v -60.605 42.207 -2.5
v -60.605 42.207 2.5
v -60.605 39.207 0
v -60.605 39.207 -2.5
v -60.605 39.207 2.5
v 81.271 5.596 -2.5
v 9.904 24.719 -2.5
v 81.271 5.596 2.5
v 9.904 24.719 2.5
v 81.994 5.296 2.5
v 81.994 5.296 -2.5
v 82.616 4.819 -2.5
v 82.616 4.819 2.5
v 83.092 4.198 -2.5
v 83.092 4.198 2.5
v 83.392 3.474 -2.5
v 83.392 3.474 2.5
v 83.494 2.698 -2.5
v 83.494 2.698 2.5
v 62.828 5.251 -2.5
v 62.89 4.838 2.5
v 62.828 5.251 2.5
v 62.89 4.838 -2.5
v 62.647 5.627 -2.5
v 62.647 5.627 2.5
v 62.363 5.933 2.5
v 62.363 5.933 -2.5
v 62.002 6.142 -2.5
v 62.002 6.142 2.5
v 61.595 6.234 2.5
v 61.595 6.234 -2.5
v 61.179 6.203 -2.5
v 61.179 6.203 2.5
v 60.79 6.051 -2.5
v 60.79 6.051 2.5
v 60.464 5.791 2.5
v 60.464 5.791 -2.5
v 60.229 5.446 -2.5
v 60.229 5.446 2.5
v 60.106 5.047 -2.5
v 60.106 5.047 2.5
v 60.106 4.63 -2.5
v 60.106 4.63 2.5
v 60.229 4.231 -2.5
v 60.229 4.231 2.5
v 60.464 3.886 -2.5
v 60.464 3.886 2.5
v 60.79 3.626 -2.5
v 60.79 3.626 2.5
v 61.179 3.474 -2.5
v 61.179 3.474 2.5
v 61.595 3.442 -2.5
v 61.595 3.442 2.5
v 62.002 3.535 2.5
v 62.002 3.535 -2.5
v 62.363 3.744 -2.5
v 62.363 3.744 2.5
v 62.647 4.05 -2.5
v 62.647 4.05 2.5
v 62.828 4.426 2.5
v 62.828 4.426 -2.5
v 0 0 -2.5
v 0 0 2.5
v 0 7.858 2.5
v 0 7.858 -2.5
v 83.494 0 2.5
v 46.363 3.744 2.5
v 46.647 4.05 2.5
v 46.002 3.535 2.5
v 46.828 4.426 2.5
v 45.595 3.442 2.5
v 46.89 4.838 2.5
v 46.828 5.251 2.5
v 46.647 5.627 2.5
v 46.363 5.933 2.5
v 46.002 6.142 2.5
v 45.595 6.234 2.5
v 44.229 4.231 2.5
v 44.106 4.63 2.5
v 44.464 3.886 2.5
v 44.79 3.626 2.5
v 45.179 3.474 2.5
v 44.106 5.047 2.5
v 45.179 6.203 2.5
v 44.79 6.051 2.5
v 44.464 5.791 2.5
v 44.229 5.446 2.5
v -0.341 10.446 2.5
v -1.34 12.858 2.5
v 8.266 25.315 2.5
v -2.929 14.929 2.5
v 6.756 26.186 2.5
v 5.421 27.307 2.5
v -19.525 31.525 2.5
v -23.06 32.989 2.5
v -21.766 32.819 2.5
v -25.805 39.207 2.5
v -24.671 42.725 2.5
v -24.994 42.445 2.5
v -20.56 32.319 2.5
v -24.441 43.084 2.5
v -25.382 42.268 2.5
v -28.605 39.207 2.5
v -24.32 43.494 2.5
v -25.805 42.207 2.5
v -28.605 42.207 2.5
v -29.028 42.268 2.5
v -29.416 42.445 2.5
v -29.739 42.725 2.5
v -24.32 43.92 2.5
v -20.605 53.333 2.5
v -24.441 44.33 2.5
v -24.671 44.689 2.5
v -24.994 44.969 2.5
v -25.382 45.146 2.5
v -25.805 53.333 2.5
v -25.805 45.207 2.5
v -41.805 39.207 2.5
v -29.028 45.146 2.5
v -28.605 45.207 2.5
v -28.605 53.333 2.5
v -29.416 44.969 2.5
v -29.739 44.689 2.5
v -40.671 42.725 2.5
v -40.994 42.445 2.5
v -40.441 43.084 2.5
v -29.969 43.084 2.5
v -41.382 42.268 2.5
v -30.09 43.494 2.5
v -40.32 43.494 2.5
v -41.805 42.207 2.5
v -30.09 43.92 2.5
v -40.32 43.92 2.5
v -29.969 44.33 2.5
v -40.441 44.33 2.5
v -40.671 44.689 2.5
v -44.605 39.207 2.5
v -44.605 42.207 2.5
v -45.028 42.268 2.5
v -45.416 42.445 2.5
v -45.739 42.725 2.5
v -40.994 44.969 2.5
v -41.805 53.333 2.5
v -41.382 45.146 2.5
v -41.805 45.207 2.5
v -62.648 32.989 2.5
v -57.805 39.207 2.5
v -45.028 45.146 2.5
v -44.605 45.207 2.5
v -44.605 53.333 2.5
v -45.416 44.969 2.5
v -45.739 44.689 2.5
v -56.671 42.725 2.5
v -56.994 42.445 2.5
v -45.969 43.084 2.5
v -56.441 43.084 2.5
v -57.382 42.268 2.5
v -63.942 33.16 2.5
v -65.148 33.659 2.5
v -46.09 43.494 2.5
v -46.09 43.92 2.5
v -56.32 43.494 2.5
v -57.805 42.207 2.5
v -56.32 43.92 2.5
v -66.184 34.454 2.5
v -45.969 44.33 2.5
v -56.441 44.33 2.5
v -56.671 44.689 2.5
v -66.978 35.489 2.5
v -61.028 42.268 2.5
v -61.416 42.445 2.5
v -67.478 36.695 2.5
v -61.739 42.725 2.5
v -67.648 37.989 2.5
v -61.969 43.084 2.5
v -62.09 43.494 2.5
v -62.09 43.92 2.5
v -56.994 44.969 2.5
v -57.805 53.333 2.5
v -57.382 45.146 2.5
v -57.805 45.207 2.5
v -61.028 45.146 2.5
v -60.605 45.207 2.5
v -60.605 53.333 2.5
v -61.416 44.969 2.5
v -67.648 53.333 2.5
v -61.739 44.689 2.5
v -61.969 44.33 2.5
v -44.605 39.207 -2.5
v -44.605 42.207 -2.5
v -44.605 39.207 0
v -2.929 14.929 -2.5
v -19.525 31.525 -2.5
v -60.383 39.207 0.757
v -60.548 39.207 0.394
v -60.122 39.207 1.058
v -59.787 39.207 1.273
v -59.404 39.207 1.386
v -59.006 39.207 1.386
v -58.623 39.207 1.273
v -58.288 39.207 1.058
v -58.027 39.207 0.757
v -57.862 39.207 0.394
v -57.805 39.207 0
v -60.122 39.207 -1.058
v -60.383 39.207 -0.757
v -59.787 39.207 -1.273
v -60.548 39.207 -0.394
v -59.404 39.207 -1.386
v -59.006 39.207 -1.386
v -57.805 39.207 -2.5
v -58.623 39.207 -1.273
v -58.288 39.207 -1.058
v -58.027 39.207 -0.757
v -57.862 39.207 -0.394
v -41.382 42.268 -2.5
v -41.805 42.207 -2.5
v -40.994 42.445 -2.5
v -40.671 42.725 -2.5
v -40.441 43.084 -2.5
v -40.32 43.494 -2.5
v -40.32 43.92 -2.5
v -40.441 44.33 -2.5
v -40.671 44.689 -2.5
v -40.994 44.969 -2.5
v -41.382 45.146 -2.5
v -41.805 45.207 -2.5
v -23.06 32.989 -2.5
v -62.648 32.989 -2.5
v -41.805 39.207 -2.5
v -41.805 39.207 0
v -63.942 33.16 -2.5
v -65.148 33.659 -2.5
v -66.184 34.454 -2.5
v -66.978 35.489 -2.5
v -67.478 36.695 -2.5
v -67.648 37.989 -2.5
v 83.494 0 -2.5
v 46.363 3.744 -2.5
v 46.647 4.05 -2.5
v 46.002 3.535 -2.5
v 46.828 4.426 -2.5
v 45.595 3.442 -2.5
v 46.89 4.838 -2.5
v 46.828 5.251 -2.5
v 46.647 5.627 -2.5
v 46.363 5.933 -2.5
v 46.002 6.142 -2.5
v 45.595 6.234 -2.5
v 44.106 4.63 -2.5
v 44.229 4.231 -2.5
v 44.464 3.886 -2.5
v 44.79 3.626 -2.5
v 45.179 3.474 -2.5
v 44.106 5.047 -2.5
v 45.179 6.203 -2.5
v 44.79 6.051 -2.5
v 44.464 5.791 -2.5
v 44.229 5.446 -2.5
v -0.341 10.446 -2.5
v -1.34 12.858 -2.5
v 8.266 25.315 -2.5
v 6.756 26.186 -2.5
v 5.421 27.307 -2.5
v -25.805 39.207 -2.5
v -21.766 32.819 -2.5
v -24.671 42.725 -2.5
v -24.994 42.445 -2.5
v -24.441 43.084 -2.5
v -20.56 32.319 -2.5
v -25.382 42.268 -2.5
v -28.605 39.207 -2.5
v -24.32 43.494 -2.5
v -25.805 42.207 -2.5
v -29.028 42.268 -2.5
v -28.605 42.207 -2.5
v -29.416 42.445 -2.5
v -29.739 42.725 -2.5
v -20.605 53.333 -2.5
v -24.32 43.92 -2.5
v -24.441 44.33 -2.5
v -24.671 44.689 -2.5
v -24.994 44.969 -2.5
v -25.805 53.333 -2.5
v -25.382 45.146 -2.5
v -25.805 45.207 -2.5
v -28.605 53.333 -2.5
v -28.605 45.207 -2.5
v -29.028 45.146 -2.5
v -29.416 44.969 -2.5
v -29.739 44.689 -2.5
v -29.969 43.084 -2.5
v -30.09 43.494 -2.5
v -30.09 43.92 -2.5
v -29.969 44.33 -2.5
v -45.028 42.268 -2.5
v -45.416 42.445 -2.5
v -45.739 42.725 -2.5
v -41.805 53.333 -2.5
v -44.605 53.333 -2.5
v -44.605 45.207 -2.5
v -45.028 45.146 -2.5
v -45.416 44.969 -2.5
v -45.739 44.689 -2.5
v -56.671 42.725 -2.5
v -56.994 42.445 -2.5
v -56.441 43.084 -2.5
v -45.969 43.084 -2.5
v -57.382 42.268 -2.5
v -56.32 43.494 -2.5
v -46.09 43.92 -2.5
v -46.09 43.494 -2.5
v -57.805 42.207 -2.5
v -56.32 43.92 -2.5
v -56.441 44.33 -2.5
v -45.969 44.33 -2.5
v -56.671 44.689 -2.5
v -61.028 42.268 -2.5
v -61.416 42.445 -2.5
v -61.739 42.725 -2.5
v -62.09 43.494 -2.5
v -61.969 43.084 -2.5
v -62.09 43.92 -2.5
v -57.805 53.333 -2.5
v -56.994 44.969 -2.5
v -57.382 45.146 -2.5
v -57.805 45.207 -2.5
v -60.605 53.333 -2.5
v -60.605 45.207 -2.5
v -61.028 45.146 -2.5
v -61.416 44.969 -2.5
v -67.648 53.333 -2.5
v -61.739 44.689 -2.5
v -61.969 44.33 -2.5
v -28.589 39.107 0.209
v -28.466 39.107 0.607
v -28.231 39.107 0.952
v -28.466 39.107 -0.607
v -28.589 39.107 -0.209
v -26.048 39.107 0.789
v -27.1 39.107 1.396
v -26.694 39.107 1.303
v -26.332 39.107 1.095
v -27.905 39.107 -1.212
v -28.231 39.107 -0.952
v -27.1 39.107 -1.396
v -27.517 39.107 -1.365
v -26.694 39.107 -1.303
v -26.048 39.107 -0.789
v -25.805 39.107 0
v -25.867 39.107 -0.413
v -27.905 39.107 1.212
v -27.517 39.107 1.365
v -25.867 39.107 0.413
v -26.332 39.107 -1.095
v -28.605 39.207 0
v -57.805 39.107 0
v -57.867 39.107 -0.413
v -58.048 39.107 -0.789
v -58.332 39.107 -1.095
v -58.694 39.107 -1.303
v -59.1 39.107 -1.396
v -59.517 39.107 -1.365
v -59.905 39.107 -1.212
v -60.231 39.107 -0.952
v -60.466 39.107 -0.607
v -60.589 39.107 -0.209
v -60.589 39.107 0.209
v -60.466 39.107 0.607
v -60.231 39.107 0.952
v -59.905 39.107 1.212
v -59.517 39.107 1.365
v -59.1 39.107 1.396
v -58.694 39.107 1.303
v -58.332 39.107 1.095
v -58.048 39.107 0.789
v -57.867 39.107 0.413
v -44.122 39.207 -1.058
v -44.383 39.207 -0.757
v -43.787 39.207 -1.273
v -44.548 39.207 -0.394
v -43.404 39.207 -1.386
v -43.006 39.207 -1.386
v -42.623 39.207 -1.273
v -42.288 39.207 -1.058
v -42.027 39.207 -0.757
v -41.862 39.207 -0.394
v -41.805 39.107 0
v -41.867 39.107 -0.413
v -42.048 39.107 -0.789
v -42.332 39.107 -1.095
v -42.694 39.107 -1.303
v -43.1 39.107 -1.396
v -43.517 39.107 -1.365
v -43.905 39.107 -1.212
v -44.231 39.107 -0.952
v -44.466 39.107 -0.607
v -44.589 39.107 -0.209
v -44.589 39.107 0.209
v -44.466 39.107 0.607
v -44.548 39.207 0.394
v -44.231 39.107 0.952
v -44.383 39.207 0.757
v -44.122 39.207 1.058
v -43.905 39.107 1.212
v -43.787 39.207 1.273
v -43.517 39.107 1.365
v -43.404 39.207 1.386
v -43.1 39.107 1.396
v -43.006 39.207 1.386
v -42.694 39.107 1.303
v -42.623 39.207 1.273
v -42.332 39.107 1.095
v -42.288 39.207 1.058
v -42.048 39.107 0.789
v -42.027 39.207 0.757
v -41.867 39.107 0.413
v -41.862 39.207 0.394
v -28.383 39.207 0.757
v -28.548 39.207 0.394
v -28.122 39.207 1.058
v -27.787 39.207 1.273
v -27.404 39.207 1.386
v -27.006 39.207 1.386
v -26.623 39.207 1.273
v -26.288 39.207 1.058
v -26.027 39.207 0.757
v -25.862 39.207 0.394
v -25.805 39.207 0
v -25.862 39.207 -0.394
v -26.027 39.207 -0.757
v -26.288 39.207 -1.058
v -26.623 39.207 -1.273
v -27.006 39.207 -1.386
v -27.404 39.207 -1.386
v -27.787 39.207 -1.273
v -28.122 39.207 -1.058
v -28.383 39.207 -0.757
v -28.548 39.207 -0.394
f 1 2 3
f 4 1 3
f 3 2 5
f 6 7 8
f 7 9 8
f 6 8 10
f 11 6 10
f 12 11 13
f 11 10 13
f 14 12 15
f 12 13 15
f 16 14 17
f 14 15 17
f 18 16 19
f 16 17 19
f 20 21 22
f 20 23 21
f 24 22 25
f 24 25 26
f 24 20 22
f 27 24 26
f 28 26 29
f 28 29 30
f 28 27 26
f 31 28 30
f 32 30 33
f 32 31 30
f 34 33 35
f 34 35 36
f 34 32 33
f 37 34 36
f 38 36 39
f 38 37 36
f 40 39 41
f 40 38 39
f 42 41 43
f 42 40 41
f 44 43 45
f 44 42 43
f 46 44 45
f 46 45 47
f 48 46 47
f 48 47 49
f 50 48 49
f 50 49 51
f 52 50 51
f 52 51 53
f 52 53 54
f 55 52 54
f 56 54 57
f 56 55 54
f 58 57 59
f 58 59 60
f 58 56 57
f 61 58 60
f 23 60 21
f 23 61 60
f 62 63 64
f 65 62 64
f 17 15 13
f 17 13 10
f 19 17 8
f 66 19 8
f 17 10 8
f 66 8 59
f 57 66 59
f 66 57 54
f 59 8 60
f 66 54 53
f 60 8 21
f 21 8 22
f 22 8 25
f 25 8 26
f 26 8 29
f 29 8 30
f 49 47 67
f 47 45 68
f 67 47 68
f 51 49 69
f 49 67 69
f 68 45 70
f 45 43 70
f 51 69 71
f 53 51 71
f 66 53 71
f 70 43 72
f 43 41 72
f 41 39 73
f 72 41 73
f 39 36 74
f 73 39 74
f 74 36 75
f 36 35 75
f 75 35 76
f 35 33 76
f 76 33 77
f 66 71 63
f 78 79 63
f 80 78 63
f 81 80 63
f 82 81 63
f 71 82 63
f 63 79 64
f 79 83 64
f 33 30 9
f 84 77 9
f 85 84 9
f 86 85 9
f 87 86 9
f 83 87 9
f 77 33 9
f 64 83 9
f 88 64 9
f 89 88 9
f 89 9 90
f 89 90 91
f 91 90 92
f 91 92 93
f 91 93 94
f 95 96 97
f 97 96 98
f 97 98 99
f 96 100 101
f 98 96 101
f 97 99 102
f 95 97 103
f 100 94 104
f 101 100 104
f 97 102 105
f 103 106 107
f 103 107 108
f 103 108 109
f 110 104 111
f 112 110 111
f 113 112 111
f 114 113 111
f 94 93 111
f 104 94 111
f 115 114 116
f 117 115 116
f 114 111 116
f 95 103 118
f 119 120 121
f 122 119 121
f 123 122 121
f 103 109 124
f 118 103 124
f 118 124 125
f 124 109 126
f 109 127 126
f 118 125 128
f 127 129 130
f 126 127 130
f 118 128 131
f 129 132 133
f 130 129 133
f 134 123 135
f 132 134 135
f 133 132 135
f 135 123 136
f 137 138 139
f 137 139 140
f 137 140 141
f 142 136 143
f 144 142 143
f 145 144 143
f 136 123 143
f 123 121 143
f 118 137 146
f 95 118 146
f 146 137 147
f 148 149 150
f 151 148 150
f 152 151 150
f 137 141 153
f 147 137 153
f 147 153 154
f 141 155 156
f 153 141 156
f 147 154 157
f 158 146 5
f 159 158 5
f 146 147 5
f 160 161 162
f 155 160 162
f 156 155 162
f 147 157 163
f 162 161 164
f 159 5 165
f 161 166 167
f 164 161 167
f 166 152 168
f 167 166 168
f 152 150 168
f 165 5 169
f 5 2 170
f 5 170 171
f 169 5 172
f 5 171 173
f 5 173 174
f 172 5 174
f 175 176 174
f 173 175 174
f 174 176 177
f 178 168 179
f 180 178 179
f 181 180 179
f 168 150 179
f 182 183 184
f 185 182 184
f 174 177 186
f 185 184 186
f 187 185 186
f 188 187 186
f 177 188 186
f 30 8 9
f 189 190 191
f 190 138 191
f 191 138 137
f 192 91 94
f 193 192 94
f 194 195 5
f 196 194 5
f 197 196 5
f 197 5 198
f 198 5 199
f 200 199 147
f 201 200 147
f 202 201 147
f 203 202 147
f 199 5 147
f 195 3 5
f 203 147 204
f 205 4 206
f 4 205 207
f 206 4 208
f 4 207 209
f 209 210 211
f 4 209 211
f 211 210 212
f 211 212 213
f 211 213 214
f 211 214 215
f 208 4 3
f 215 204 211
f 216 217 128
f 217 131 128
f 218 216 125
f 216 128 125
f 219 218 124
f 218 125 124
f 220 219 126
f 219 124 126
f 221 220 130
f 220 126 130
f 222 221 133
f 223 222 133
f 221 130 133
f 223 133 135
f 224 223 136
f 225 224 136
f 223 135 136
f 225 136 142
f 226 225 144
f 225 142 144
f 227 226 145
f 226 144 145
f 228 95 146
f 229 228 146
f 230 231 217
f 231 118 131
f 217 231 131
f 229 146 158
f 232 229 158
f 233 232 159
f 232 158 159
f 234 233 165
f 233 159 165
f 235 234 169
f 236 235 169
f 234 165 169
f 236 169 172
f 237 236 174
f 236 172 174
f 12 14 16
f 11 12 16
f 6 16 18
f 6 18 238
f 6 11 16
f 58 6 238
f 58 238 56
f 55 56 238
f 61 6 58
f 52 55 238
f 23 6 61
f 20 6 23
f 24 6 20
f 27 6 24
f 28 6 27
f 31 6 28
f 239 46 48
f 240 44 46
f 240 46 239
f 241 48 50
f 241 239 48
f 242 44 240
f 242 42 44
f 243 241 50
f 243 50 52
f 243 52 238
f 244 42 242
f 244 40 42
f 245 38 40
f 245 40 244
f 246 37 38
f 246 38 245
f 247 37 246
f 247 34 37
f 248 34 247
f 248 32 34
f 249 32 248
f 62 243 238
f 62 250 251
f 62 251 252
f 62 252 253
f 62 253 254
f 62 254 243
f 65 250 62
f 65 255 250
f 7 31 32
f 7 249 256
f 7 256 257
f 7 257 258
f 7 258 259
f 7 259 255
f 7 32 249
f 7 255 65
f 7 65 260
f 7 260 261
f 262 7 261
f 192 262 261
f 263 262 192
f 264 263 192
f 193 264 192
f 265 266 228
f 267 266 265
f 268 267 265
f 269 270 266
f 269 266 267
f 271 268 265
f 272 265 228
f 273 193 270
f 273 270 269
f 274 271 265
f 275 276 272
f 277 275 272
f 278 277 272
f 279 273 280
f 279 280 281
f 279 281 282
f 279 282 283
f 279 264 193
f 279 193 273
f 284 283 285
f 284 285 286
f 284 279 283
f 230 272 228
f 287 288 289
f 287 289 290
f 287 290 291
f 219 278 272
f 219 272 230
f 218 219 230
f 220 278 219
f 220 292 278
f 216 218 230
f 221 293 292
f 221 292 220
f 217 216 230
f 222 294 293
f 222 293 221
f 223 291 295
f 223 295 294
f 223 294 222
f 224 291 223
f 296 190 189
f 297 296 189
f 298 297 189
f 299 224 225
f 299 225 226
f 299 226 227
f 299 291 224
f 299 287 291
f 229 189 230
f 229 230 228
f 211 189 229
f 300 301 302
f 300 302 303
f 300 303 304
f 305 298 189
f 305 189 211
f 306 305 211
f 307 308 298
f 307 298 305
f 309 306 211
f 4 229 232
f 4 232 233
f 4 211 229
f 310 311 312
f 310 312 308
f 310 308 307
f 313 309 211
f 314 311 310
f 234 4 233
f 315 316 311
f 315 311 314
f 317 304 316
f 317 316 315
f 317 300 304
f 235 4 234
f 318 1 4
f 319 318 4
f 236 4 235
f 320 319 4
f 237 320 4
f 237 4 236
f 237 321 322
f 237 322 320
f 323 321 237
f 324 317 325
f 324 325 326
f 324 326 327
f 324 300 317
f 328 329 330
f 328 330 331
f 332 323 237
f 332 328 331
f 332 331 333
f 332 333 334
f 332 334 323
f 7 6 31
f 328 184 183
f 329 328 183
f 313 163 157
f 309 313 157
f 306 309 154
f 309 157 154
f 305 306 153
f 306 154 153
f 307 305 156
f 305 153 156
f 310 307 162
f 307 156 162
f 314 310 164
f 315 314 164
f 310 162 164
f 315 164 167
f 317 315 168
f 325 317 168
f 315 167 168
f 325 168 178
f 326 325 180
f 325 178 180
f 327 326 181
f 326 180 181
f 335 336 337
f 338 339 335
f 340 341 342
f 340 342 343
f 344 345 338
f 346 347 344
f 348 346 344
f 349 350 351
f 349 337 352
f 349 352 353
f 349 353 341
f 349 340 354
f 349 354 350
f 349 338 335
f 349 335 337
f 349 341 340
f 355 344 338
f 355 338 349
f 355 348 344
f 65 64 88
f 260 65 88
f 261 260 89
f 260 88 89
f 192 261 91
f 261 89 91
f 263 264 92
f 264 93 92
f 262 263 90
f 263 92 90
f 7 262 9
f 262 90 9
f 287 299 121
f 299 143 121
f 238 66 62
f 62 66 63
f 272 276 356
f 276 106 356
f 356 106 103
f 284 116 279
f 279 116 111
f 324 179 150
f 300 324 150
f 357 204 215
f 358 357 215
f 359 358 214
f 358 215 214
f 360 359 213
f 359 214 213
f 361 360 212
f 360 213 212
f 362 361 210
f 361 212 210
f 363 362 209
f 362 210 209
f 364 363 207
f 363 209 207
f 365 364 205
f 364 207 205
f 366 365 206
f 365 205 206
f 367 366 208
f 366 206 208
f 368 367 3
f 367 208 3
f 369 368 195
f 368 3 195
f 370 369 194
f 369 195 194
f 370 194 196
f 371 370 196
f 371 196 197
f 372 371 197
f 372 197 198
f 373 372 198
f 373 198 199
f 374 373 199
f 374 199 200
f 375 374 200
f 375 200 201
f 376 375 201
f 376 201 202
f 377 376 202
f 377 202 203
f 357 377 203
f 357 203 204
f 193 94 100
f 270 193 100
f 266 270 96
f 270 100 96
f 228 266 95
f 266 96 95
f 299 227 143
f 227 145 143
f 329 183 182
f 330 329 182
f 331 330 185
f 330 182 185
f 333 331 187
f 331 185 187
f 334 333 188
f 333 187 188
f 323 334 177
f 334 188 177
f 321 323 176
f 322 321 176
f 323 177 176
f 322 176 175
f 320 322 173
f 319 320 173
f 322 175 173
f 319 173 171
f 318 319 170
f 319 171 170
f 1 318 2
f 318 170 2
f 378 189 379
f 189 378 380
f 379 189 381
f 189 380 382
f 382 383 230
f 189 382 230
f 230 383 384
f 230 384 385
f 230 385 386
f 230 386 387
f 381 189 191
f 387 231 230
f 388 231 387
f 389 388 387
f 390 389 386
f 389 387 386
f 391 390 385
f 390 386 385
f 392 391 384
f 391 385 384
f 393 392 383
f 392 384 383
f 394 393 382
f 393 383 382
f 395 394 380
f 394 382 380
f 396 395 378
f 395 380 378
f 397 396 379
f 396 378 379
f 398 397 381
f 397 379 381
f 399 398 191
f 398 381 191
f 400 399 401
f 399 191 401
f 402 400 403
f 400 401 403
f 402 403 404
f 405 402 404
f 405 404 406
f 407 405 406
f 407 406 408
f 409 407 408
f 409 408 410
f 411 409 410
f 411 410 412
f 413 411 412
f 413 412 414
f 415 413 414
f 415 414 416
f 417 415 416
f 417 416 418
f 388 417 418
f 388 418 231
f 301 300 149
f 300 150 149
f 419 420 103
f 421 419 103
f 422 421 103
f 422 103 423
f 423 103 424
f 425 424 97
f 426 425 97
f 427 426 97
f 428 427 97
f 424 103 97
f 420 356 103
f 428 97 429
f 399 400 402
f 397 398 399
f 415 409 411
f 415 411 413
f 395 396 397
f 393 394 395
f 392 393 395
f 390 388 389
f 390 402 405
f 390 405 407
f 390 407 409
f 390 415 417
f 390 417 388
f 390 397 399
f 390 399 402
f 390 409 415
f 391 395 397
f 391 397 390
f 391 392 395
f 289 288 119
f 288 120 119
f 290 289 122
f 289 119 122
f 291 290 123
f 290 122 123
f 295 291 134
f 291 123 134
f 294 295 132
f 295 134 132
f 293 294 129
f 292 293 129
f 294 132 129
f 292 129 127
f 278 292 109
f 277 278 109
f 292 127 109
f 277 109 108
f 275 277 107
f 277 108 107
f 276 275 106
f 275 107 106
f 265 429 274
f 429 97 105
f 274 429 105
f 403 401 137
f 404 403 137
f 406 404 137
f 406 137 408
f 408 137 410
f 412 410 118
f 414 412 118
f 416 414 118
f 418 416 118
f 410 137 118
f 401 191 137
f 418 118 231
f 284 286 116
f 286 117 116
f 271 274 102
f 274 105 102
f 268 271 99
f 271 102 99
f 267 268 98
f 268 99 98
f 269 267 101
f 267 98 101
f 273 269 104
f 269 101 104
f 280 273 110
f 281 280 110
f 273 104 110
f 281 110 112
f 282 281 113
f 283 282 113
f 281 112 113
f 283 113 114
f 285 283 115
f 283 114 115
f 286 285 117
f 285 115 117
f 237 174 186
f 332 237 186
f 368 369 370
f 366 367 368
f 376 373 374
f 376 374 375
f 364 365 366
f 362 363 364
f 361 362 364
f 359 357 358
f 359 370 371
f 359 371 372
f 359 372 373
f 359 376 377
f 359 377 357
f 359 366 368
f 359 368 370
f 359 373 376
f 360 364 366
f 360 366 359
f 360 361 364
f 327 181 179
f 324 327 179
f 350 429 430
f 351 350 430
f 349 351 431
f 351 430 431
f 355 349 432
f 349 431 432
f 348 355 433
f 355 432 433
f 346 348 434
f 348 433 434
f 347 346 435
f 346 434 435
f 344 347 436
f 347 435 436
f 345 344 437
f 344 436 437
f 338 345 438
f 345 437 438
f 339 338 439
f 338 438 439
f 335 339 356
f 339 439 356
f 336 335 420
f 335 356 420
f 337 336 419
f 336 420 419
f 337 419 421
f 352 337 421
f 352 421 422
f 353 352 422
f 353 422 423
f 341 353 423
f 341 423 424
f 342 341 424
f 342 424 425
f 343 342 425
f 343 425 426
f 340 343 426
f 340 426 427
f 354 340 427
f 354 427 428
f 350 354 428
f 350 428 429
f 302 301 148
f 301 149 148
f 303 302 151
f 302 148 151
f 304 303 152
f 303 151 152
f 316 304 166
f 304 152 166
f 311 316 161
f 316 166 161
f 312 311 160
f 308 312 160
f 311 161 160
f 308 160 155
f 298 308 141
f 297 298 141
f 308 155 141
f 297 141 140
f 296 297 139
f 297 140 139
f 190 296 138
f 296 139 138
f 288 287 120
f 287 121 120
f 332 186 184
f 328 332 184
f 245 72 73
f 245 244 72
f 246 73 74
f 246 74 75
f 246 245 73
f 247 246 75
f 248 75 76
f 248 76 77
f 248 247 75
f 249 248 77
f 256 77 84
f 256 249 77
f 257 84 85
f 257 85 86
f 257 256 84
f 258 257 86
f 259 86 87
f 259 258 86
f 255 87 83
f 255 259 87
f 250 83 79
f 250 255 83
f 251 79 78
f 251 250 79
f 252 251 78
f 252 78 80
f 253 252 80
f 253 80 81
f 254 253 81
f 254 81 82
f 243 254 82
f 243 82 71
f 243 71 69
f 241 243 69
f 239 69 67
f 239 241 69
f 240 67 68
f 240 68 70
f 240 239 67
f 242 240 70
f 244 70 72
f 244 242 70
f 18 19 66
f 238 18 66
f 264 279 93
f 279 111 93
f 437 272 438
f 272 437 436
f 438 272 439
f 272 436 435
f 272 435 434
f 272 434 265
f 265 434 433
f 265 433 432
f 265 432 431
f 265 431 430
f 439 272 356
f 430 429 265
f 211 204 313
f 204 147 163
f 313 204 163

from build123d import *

# Parameters (mm, degrees)
SKETCH_1_R          = 1.4
EXTRUDE_1_DEPTH     = 2.5
SKETCH_2_R          = 1.4
CUT_EXTRUDE_1_DEPTH = 0.1


with BuildPart() as part:
    # 草图1 → 凸台-拉伸1 (new body, symmetric)
    with BuildSketch(Plane.XY):
        with BuildLine():
            Line((-57.805032963, 53.332573096), (-44.605032963, 53.332573096))
            Line((-44.605032963, 53.332573096), (-44.605032963, 45.206973096))
            ThreePointArc((-44.605032963, 45.206973096), (-46.105032963, 43.706973096), (-44.605032963, 42.206973096))
            Line((-44.605032963, 42.206973096), (-44.605032963, 39.206973096))
            Line((-44.605032963, 39.206973096), (-41.805032963, 39.206973096))
            Line((-41.805032963, 39.206973096), (-41.805032963, 42.206973096))
            ThreePointArc((-41.805032963, 42.206973096), (-40.305032963, 43.706973096), (-41.805032963, 45.206973096))
            Line((-41.805032963, 45.206973096), (-41.805032963, 53.332573096))
            Line((-41.805032963, 53.332573096), (-28.605032963, 53.332573096))
            Line((-28.605032963, 53.332573096), (-28.605032963, 45.206973096))
            ThreePointArc((-28.605032963, 45.206973096), (-30.105032963, 43.706973096), (-28.605032963, 42.206973096))
            Line((-28.605032963, 42.206973096), (-28.605032963, 39.206973096))
            Line((-28.605032963, 39.206973096), (-25.805032963, 39.206973096))
            Line((-25.805032963, 39.206973096), (-25.805032963, 42.206973096))
            ThreePointArc((-25.805032963, 42.206973096), (-24.305032963, 43.706973096), (-25.805032963, 45.206973096))
            Line((-25.805032963, 45.206973096), (-25.805032963, 53.332573096))
            Line((-25.805032963, 53.332573096), (-20.605032963, 53.332573096))
            Line((-20.605032963, 53.332573096), (5.420799629, 27.306740503))
            ThreePointArc((5.420799629, 27.306740503), (7.491867441, 25.717554277), (9.90367699, 24.718550052))
            Line((9.90367699, 24.718550052), (81.270764772, 5.595796515))
            ThreePointArc((81.270764772, 5.595796515), (82.874367658, 4.524303323), (83.494307637, 2.698019036))
            Line((83.494307637, 2.698019036), (83.494307637, 0))
            Line((83.494307637, 0), (0, 0))
            Line((0, 0), (0, 7.857864376))
            ThreePointArc((0, 7.857864376), (-0.761204675, 11.6846987), (-2.928932188, 14.928932188))
            Line((-2.928932188, 14.928932188), (-19.524740269, 31.524740269))
            ThreePointArc((-19.524740269, 31.524740269), (-21.146857013, 32.608604026), (-23.060274175, 32.989206363))
            Line((-23.060274175, 32.989206363), (-62.648227072, 32.989206363))
            ThreePointArc((-62.648227072, 32.989206363), (-66.183760977, 34.453672457), (-67.648227072, 37.989206363))
            Line((-67.648227072, 37.989206363), (-67.648227072, 53.332573096))
            Line((-67.648227072, 53.332573096), (-60.605032963, 53.332573096))
            Line((-60.605032963, 53.332573096), (-60.605032963, 45.206973096))
            ThreePointArc((-60.605032963, 45.206973096), (-62.105032963, 43.706973096), (-60.605032963, 42.206973096))
            Line((-60.605032963, 42.206973096), (-60.605032963, 39.206973096))
            Line((-60.605032963, 39.206973096), (-57.805032963, 39.206973096))
            Line((-57.805032963, 39.206973096), (-57.805032963, 42.206973096))
            ThreePointArc((-57.805032963, 42.206973096), (-56.305032963, 43.706973096), (-57.805032963, 45.206973096))
            Line((-57.805032963, 45.206973096), (-57.805032963, 53.332573096))
        make_face()
        with Locations((45.49026085, 4.838412731)):
            Circle(SKETCH_1_R, mode=Mode.SUBTRACT)
        with Locations((61.49026085, 4.838412731)):
            Circle(SKETCH_1_R, mode=Mode.SUBTRACT)
    extrude(amount=EXTRUDE_1_DEPTH, both=True)

    # 草图2 → 切除-拉伸1 (cut)
    with BuildSketch(Plane(origin=(0, 39.206973096, 0), x_dir=(1, 0, 0), z_dir=(0, 1, 0))):
        with Locations((-59.205032963, 0)):
            Circle(SKETCH_2_R)
        with Locations((-43.205032963, 0)):
            Circle(SKETCH_2_R)
        with Locations((-27.205032963, 0)):
            Circle(SKETCH_2_R)
    extrude(amount=-CUT_EXTRUDE_1_DEPTH, mode=Mode.SUBTRACT)


solid = part.part
